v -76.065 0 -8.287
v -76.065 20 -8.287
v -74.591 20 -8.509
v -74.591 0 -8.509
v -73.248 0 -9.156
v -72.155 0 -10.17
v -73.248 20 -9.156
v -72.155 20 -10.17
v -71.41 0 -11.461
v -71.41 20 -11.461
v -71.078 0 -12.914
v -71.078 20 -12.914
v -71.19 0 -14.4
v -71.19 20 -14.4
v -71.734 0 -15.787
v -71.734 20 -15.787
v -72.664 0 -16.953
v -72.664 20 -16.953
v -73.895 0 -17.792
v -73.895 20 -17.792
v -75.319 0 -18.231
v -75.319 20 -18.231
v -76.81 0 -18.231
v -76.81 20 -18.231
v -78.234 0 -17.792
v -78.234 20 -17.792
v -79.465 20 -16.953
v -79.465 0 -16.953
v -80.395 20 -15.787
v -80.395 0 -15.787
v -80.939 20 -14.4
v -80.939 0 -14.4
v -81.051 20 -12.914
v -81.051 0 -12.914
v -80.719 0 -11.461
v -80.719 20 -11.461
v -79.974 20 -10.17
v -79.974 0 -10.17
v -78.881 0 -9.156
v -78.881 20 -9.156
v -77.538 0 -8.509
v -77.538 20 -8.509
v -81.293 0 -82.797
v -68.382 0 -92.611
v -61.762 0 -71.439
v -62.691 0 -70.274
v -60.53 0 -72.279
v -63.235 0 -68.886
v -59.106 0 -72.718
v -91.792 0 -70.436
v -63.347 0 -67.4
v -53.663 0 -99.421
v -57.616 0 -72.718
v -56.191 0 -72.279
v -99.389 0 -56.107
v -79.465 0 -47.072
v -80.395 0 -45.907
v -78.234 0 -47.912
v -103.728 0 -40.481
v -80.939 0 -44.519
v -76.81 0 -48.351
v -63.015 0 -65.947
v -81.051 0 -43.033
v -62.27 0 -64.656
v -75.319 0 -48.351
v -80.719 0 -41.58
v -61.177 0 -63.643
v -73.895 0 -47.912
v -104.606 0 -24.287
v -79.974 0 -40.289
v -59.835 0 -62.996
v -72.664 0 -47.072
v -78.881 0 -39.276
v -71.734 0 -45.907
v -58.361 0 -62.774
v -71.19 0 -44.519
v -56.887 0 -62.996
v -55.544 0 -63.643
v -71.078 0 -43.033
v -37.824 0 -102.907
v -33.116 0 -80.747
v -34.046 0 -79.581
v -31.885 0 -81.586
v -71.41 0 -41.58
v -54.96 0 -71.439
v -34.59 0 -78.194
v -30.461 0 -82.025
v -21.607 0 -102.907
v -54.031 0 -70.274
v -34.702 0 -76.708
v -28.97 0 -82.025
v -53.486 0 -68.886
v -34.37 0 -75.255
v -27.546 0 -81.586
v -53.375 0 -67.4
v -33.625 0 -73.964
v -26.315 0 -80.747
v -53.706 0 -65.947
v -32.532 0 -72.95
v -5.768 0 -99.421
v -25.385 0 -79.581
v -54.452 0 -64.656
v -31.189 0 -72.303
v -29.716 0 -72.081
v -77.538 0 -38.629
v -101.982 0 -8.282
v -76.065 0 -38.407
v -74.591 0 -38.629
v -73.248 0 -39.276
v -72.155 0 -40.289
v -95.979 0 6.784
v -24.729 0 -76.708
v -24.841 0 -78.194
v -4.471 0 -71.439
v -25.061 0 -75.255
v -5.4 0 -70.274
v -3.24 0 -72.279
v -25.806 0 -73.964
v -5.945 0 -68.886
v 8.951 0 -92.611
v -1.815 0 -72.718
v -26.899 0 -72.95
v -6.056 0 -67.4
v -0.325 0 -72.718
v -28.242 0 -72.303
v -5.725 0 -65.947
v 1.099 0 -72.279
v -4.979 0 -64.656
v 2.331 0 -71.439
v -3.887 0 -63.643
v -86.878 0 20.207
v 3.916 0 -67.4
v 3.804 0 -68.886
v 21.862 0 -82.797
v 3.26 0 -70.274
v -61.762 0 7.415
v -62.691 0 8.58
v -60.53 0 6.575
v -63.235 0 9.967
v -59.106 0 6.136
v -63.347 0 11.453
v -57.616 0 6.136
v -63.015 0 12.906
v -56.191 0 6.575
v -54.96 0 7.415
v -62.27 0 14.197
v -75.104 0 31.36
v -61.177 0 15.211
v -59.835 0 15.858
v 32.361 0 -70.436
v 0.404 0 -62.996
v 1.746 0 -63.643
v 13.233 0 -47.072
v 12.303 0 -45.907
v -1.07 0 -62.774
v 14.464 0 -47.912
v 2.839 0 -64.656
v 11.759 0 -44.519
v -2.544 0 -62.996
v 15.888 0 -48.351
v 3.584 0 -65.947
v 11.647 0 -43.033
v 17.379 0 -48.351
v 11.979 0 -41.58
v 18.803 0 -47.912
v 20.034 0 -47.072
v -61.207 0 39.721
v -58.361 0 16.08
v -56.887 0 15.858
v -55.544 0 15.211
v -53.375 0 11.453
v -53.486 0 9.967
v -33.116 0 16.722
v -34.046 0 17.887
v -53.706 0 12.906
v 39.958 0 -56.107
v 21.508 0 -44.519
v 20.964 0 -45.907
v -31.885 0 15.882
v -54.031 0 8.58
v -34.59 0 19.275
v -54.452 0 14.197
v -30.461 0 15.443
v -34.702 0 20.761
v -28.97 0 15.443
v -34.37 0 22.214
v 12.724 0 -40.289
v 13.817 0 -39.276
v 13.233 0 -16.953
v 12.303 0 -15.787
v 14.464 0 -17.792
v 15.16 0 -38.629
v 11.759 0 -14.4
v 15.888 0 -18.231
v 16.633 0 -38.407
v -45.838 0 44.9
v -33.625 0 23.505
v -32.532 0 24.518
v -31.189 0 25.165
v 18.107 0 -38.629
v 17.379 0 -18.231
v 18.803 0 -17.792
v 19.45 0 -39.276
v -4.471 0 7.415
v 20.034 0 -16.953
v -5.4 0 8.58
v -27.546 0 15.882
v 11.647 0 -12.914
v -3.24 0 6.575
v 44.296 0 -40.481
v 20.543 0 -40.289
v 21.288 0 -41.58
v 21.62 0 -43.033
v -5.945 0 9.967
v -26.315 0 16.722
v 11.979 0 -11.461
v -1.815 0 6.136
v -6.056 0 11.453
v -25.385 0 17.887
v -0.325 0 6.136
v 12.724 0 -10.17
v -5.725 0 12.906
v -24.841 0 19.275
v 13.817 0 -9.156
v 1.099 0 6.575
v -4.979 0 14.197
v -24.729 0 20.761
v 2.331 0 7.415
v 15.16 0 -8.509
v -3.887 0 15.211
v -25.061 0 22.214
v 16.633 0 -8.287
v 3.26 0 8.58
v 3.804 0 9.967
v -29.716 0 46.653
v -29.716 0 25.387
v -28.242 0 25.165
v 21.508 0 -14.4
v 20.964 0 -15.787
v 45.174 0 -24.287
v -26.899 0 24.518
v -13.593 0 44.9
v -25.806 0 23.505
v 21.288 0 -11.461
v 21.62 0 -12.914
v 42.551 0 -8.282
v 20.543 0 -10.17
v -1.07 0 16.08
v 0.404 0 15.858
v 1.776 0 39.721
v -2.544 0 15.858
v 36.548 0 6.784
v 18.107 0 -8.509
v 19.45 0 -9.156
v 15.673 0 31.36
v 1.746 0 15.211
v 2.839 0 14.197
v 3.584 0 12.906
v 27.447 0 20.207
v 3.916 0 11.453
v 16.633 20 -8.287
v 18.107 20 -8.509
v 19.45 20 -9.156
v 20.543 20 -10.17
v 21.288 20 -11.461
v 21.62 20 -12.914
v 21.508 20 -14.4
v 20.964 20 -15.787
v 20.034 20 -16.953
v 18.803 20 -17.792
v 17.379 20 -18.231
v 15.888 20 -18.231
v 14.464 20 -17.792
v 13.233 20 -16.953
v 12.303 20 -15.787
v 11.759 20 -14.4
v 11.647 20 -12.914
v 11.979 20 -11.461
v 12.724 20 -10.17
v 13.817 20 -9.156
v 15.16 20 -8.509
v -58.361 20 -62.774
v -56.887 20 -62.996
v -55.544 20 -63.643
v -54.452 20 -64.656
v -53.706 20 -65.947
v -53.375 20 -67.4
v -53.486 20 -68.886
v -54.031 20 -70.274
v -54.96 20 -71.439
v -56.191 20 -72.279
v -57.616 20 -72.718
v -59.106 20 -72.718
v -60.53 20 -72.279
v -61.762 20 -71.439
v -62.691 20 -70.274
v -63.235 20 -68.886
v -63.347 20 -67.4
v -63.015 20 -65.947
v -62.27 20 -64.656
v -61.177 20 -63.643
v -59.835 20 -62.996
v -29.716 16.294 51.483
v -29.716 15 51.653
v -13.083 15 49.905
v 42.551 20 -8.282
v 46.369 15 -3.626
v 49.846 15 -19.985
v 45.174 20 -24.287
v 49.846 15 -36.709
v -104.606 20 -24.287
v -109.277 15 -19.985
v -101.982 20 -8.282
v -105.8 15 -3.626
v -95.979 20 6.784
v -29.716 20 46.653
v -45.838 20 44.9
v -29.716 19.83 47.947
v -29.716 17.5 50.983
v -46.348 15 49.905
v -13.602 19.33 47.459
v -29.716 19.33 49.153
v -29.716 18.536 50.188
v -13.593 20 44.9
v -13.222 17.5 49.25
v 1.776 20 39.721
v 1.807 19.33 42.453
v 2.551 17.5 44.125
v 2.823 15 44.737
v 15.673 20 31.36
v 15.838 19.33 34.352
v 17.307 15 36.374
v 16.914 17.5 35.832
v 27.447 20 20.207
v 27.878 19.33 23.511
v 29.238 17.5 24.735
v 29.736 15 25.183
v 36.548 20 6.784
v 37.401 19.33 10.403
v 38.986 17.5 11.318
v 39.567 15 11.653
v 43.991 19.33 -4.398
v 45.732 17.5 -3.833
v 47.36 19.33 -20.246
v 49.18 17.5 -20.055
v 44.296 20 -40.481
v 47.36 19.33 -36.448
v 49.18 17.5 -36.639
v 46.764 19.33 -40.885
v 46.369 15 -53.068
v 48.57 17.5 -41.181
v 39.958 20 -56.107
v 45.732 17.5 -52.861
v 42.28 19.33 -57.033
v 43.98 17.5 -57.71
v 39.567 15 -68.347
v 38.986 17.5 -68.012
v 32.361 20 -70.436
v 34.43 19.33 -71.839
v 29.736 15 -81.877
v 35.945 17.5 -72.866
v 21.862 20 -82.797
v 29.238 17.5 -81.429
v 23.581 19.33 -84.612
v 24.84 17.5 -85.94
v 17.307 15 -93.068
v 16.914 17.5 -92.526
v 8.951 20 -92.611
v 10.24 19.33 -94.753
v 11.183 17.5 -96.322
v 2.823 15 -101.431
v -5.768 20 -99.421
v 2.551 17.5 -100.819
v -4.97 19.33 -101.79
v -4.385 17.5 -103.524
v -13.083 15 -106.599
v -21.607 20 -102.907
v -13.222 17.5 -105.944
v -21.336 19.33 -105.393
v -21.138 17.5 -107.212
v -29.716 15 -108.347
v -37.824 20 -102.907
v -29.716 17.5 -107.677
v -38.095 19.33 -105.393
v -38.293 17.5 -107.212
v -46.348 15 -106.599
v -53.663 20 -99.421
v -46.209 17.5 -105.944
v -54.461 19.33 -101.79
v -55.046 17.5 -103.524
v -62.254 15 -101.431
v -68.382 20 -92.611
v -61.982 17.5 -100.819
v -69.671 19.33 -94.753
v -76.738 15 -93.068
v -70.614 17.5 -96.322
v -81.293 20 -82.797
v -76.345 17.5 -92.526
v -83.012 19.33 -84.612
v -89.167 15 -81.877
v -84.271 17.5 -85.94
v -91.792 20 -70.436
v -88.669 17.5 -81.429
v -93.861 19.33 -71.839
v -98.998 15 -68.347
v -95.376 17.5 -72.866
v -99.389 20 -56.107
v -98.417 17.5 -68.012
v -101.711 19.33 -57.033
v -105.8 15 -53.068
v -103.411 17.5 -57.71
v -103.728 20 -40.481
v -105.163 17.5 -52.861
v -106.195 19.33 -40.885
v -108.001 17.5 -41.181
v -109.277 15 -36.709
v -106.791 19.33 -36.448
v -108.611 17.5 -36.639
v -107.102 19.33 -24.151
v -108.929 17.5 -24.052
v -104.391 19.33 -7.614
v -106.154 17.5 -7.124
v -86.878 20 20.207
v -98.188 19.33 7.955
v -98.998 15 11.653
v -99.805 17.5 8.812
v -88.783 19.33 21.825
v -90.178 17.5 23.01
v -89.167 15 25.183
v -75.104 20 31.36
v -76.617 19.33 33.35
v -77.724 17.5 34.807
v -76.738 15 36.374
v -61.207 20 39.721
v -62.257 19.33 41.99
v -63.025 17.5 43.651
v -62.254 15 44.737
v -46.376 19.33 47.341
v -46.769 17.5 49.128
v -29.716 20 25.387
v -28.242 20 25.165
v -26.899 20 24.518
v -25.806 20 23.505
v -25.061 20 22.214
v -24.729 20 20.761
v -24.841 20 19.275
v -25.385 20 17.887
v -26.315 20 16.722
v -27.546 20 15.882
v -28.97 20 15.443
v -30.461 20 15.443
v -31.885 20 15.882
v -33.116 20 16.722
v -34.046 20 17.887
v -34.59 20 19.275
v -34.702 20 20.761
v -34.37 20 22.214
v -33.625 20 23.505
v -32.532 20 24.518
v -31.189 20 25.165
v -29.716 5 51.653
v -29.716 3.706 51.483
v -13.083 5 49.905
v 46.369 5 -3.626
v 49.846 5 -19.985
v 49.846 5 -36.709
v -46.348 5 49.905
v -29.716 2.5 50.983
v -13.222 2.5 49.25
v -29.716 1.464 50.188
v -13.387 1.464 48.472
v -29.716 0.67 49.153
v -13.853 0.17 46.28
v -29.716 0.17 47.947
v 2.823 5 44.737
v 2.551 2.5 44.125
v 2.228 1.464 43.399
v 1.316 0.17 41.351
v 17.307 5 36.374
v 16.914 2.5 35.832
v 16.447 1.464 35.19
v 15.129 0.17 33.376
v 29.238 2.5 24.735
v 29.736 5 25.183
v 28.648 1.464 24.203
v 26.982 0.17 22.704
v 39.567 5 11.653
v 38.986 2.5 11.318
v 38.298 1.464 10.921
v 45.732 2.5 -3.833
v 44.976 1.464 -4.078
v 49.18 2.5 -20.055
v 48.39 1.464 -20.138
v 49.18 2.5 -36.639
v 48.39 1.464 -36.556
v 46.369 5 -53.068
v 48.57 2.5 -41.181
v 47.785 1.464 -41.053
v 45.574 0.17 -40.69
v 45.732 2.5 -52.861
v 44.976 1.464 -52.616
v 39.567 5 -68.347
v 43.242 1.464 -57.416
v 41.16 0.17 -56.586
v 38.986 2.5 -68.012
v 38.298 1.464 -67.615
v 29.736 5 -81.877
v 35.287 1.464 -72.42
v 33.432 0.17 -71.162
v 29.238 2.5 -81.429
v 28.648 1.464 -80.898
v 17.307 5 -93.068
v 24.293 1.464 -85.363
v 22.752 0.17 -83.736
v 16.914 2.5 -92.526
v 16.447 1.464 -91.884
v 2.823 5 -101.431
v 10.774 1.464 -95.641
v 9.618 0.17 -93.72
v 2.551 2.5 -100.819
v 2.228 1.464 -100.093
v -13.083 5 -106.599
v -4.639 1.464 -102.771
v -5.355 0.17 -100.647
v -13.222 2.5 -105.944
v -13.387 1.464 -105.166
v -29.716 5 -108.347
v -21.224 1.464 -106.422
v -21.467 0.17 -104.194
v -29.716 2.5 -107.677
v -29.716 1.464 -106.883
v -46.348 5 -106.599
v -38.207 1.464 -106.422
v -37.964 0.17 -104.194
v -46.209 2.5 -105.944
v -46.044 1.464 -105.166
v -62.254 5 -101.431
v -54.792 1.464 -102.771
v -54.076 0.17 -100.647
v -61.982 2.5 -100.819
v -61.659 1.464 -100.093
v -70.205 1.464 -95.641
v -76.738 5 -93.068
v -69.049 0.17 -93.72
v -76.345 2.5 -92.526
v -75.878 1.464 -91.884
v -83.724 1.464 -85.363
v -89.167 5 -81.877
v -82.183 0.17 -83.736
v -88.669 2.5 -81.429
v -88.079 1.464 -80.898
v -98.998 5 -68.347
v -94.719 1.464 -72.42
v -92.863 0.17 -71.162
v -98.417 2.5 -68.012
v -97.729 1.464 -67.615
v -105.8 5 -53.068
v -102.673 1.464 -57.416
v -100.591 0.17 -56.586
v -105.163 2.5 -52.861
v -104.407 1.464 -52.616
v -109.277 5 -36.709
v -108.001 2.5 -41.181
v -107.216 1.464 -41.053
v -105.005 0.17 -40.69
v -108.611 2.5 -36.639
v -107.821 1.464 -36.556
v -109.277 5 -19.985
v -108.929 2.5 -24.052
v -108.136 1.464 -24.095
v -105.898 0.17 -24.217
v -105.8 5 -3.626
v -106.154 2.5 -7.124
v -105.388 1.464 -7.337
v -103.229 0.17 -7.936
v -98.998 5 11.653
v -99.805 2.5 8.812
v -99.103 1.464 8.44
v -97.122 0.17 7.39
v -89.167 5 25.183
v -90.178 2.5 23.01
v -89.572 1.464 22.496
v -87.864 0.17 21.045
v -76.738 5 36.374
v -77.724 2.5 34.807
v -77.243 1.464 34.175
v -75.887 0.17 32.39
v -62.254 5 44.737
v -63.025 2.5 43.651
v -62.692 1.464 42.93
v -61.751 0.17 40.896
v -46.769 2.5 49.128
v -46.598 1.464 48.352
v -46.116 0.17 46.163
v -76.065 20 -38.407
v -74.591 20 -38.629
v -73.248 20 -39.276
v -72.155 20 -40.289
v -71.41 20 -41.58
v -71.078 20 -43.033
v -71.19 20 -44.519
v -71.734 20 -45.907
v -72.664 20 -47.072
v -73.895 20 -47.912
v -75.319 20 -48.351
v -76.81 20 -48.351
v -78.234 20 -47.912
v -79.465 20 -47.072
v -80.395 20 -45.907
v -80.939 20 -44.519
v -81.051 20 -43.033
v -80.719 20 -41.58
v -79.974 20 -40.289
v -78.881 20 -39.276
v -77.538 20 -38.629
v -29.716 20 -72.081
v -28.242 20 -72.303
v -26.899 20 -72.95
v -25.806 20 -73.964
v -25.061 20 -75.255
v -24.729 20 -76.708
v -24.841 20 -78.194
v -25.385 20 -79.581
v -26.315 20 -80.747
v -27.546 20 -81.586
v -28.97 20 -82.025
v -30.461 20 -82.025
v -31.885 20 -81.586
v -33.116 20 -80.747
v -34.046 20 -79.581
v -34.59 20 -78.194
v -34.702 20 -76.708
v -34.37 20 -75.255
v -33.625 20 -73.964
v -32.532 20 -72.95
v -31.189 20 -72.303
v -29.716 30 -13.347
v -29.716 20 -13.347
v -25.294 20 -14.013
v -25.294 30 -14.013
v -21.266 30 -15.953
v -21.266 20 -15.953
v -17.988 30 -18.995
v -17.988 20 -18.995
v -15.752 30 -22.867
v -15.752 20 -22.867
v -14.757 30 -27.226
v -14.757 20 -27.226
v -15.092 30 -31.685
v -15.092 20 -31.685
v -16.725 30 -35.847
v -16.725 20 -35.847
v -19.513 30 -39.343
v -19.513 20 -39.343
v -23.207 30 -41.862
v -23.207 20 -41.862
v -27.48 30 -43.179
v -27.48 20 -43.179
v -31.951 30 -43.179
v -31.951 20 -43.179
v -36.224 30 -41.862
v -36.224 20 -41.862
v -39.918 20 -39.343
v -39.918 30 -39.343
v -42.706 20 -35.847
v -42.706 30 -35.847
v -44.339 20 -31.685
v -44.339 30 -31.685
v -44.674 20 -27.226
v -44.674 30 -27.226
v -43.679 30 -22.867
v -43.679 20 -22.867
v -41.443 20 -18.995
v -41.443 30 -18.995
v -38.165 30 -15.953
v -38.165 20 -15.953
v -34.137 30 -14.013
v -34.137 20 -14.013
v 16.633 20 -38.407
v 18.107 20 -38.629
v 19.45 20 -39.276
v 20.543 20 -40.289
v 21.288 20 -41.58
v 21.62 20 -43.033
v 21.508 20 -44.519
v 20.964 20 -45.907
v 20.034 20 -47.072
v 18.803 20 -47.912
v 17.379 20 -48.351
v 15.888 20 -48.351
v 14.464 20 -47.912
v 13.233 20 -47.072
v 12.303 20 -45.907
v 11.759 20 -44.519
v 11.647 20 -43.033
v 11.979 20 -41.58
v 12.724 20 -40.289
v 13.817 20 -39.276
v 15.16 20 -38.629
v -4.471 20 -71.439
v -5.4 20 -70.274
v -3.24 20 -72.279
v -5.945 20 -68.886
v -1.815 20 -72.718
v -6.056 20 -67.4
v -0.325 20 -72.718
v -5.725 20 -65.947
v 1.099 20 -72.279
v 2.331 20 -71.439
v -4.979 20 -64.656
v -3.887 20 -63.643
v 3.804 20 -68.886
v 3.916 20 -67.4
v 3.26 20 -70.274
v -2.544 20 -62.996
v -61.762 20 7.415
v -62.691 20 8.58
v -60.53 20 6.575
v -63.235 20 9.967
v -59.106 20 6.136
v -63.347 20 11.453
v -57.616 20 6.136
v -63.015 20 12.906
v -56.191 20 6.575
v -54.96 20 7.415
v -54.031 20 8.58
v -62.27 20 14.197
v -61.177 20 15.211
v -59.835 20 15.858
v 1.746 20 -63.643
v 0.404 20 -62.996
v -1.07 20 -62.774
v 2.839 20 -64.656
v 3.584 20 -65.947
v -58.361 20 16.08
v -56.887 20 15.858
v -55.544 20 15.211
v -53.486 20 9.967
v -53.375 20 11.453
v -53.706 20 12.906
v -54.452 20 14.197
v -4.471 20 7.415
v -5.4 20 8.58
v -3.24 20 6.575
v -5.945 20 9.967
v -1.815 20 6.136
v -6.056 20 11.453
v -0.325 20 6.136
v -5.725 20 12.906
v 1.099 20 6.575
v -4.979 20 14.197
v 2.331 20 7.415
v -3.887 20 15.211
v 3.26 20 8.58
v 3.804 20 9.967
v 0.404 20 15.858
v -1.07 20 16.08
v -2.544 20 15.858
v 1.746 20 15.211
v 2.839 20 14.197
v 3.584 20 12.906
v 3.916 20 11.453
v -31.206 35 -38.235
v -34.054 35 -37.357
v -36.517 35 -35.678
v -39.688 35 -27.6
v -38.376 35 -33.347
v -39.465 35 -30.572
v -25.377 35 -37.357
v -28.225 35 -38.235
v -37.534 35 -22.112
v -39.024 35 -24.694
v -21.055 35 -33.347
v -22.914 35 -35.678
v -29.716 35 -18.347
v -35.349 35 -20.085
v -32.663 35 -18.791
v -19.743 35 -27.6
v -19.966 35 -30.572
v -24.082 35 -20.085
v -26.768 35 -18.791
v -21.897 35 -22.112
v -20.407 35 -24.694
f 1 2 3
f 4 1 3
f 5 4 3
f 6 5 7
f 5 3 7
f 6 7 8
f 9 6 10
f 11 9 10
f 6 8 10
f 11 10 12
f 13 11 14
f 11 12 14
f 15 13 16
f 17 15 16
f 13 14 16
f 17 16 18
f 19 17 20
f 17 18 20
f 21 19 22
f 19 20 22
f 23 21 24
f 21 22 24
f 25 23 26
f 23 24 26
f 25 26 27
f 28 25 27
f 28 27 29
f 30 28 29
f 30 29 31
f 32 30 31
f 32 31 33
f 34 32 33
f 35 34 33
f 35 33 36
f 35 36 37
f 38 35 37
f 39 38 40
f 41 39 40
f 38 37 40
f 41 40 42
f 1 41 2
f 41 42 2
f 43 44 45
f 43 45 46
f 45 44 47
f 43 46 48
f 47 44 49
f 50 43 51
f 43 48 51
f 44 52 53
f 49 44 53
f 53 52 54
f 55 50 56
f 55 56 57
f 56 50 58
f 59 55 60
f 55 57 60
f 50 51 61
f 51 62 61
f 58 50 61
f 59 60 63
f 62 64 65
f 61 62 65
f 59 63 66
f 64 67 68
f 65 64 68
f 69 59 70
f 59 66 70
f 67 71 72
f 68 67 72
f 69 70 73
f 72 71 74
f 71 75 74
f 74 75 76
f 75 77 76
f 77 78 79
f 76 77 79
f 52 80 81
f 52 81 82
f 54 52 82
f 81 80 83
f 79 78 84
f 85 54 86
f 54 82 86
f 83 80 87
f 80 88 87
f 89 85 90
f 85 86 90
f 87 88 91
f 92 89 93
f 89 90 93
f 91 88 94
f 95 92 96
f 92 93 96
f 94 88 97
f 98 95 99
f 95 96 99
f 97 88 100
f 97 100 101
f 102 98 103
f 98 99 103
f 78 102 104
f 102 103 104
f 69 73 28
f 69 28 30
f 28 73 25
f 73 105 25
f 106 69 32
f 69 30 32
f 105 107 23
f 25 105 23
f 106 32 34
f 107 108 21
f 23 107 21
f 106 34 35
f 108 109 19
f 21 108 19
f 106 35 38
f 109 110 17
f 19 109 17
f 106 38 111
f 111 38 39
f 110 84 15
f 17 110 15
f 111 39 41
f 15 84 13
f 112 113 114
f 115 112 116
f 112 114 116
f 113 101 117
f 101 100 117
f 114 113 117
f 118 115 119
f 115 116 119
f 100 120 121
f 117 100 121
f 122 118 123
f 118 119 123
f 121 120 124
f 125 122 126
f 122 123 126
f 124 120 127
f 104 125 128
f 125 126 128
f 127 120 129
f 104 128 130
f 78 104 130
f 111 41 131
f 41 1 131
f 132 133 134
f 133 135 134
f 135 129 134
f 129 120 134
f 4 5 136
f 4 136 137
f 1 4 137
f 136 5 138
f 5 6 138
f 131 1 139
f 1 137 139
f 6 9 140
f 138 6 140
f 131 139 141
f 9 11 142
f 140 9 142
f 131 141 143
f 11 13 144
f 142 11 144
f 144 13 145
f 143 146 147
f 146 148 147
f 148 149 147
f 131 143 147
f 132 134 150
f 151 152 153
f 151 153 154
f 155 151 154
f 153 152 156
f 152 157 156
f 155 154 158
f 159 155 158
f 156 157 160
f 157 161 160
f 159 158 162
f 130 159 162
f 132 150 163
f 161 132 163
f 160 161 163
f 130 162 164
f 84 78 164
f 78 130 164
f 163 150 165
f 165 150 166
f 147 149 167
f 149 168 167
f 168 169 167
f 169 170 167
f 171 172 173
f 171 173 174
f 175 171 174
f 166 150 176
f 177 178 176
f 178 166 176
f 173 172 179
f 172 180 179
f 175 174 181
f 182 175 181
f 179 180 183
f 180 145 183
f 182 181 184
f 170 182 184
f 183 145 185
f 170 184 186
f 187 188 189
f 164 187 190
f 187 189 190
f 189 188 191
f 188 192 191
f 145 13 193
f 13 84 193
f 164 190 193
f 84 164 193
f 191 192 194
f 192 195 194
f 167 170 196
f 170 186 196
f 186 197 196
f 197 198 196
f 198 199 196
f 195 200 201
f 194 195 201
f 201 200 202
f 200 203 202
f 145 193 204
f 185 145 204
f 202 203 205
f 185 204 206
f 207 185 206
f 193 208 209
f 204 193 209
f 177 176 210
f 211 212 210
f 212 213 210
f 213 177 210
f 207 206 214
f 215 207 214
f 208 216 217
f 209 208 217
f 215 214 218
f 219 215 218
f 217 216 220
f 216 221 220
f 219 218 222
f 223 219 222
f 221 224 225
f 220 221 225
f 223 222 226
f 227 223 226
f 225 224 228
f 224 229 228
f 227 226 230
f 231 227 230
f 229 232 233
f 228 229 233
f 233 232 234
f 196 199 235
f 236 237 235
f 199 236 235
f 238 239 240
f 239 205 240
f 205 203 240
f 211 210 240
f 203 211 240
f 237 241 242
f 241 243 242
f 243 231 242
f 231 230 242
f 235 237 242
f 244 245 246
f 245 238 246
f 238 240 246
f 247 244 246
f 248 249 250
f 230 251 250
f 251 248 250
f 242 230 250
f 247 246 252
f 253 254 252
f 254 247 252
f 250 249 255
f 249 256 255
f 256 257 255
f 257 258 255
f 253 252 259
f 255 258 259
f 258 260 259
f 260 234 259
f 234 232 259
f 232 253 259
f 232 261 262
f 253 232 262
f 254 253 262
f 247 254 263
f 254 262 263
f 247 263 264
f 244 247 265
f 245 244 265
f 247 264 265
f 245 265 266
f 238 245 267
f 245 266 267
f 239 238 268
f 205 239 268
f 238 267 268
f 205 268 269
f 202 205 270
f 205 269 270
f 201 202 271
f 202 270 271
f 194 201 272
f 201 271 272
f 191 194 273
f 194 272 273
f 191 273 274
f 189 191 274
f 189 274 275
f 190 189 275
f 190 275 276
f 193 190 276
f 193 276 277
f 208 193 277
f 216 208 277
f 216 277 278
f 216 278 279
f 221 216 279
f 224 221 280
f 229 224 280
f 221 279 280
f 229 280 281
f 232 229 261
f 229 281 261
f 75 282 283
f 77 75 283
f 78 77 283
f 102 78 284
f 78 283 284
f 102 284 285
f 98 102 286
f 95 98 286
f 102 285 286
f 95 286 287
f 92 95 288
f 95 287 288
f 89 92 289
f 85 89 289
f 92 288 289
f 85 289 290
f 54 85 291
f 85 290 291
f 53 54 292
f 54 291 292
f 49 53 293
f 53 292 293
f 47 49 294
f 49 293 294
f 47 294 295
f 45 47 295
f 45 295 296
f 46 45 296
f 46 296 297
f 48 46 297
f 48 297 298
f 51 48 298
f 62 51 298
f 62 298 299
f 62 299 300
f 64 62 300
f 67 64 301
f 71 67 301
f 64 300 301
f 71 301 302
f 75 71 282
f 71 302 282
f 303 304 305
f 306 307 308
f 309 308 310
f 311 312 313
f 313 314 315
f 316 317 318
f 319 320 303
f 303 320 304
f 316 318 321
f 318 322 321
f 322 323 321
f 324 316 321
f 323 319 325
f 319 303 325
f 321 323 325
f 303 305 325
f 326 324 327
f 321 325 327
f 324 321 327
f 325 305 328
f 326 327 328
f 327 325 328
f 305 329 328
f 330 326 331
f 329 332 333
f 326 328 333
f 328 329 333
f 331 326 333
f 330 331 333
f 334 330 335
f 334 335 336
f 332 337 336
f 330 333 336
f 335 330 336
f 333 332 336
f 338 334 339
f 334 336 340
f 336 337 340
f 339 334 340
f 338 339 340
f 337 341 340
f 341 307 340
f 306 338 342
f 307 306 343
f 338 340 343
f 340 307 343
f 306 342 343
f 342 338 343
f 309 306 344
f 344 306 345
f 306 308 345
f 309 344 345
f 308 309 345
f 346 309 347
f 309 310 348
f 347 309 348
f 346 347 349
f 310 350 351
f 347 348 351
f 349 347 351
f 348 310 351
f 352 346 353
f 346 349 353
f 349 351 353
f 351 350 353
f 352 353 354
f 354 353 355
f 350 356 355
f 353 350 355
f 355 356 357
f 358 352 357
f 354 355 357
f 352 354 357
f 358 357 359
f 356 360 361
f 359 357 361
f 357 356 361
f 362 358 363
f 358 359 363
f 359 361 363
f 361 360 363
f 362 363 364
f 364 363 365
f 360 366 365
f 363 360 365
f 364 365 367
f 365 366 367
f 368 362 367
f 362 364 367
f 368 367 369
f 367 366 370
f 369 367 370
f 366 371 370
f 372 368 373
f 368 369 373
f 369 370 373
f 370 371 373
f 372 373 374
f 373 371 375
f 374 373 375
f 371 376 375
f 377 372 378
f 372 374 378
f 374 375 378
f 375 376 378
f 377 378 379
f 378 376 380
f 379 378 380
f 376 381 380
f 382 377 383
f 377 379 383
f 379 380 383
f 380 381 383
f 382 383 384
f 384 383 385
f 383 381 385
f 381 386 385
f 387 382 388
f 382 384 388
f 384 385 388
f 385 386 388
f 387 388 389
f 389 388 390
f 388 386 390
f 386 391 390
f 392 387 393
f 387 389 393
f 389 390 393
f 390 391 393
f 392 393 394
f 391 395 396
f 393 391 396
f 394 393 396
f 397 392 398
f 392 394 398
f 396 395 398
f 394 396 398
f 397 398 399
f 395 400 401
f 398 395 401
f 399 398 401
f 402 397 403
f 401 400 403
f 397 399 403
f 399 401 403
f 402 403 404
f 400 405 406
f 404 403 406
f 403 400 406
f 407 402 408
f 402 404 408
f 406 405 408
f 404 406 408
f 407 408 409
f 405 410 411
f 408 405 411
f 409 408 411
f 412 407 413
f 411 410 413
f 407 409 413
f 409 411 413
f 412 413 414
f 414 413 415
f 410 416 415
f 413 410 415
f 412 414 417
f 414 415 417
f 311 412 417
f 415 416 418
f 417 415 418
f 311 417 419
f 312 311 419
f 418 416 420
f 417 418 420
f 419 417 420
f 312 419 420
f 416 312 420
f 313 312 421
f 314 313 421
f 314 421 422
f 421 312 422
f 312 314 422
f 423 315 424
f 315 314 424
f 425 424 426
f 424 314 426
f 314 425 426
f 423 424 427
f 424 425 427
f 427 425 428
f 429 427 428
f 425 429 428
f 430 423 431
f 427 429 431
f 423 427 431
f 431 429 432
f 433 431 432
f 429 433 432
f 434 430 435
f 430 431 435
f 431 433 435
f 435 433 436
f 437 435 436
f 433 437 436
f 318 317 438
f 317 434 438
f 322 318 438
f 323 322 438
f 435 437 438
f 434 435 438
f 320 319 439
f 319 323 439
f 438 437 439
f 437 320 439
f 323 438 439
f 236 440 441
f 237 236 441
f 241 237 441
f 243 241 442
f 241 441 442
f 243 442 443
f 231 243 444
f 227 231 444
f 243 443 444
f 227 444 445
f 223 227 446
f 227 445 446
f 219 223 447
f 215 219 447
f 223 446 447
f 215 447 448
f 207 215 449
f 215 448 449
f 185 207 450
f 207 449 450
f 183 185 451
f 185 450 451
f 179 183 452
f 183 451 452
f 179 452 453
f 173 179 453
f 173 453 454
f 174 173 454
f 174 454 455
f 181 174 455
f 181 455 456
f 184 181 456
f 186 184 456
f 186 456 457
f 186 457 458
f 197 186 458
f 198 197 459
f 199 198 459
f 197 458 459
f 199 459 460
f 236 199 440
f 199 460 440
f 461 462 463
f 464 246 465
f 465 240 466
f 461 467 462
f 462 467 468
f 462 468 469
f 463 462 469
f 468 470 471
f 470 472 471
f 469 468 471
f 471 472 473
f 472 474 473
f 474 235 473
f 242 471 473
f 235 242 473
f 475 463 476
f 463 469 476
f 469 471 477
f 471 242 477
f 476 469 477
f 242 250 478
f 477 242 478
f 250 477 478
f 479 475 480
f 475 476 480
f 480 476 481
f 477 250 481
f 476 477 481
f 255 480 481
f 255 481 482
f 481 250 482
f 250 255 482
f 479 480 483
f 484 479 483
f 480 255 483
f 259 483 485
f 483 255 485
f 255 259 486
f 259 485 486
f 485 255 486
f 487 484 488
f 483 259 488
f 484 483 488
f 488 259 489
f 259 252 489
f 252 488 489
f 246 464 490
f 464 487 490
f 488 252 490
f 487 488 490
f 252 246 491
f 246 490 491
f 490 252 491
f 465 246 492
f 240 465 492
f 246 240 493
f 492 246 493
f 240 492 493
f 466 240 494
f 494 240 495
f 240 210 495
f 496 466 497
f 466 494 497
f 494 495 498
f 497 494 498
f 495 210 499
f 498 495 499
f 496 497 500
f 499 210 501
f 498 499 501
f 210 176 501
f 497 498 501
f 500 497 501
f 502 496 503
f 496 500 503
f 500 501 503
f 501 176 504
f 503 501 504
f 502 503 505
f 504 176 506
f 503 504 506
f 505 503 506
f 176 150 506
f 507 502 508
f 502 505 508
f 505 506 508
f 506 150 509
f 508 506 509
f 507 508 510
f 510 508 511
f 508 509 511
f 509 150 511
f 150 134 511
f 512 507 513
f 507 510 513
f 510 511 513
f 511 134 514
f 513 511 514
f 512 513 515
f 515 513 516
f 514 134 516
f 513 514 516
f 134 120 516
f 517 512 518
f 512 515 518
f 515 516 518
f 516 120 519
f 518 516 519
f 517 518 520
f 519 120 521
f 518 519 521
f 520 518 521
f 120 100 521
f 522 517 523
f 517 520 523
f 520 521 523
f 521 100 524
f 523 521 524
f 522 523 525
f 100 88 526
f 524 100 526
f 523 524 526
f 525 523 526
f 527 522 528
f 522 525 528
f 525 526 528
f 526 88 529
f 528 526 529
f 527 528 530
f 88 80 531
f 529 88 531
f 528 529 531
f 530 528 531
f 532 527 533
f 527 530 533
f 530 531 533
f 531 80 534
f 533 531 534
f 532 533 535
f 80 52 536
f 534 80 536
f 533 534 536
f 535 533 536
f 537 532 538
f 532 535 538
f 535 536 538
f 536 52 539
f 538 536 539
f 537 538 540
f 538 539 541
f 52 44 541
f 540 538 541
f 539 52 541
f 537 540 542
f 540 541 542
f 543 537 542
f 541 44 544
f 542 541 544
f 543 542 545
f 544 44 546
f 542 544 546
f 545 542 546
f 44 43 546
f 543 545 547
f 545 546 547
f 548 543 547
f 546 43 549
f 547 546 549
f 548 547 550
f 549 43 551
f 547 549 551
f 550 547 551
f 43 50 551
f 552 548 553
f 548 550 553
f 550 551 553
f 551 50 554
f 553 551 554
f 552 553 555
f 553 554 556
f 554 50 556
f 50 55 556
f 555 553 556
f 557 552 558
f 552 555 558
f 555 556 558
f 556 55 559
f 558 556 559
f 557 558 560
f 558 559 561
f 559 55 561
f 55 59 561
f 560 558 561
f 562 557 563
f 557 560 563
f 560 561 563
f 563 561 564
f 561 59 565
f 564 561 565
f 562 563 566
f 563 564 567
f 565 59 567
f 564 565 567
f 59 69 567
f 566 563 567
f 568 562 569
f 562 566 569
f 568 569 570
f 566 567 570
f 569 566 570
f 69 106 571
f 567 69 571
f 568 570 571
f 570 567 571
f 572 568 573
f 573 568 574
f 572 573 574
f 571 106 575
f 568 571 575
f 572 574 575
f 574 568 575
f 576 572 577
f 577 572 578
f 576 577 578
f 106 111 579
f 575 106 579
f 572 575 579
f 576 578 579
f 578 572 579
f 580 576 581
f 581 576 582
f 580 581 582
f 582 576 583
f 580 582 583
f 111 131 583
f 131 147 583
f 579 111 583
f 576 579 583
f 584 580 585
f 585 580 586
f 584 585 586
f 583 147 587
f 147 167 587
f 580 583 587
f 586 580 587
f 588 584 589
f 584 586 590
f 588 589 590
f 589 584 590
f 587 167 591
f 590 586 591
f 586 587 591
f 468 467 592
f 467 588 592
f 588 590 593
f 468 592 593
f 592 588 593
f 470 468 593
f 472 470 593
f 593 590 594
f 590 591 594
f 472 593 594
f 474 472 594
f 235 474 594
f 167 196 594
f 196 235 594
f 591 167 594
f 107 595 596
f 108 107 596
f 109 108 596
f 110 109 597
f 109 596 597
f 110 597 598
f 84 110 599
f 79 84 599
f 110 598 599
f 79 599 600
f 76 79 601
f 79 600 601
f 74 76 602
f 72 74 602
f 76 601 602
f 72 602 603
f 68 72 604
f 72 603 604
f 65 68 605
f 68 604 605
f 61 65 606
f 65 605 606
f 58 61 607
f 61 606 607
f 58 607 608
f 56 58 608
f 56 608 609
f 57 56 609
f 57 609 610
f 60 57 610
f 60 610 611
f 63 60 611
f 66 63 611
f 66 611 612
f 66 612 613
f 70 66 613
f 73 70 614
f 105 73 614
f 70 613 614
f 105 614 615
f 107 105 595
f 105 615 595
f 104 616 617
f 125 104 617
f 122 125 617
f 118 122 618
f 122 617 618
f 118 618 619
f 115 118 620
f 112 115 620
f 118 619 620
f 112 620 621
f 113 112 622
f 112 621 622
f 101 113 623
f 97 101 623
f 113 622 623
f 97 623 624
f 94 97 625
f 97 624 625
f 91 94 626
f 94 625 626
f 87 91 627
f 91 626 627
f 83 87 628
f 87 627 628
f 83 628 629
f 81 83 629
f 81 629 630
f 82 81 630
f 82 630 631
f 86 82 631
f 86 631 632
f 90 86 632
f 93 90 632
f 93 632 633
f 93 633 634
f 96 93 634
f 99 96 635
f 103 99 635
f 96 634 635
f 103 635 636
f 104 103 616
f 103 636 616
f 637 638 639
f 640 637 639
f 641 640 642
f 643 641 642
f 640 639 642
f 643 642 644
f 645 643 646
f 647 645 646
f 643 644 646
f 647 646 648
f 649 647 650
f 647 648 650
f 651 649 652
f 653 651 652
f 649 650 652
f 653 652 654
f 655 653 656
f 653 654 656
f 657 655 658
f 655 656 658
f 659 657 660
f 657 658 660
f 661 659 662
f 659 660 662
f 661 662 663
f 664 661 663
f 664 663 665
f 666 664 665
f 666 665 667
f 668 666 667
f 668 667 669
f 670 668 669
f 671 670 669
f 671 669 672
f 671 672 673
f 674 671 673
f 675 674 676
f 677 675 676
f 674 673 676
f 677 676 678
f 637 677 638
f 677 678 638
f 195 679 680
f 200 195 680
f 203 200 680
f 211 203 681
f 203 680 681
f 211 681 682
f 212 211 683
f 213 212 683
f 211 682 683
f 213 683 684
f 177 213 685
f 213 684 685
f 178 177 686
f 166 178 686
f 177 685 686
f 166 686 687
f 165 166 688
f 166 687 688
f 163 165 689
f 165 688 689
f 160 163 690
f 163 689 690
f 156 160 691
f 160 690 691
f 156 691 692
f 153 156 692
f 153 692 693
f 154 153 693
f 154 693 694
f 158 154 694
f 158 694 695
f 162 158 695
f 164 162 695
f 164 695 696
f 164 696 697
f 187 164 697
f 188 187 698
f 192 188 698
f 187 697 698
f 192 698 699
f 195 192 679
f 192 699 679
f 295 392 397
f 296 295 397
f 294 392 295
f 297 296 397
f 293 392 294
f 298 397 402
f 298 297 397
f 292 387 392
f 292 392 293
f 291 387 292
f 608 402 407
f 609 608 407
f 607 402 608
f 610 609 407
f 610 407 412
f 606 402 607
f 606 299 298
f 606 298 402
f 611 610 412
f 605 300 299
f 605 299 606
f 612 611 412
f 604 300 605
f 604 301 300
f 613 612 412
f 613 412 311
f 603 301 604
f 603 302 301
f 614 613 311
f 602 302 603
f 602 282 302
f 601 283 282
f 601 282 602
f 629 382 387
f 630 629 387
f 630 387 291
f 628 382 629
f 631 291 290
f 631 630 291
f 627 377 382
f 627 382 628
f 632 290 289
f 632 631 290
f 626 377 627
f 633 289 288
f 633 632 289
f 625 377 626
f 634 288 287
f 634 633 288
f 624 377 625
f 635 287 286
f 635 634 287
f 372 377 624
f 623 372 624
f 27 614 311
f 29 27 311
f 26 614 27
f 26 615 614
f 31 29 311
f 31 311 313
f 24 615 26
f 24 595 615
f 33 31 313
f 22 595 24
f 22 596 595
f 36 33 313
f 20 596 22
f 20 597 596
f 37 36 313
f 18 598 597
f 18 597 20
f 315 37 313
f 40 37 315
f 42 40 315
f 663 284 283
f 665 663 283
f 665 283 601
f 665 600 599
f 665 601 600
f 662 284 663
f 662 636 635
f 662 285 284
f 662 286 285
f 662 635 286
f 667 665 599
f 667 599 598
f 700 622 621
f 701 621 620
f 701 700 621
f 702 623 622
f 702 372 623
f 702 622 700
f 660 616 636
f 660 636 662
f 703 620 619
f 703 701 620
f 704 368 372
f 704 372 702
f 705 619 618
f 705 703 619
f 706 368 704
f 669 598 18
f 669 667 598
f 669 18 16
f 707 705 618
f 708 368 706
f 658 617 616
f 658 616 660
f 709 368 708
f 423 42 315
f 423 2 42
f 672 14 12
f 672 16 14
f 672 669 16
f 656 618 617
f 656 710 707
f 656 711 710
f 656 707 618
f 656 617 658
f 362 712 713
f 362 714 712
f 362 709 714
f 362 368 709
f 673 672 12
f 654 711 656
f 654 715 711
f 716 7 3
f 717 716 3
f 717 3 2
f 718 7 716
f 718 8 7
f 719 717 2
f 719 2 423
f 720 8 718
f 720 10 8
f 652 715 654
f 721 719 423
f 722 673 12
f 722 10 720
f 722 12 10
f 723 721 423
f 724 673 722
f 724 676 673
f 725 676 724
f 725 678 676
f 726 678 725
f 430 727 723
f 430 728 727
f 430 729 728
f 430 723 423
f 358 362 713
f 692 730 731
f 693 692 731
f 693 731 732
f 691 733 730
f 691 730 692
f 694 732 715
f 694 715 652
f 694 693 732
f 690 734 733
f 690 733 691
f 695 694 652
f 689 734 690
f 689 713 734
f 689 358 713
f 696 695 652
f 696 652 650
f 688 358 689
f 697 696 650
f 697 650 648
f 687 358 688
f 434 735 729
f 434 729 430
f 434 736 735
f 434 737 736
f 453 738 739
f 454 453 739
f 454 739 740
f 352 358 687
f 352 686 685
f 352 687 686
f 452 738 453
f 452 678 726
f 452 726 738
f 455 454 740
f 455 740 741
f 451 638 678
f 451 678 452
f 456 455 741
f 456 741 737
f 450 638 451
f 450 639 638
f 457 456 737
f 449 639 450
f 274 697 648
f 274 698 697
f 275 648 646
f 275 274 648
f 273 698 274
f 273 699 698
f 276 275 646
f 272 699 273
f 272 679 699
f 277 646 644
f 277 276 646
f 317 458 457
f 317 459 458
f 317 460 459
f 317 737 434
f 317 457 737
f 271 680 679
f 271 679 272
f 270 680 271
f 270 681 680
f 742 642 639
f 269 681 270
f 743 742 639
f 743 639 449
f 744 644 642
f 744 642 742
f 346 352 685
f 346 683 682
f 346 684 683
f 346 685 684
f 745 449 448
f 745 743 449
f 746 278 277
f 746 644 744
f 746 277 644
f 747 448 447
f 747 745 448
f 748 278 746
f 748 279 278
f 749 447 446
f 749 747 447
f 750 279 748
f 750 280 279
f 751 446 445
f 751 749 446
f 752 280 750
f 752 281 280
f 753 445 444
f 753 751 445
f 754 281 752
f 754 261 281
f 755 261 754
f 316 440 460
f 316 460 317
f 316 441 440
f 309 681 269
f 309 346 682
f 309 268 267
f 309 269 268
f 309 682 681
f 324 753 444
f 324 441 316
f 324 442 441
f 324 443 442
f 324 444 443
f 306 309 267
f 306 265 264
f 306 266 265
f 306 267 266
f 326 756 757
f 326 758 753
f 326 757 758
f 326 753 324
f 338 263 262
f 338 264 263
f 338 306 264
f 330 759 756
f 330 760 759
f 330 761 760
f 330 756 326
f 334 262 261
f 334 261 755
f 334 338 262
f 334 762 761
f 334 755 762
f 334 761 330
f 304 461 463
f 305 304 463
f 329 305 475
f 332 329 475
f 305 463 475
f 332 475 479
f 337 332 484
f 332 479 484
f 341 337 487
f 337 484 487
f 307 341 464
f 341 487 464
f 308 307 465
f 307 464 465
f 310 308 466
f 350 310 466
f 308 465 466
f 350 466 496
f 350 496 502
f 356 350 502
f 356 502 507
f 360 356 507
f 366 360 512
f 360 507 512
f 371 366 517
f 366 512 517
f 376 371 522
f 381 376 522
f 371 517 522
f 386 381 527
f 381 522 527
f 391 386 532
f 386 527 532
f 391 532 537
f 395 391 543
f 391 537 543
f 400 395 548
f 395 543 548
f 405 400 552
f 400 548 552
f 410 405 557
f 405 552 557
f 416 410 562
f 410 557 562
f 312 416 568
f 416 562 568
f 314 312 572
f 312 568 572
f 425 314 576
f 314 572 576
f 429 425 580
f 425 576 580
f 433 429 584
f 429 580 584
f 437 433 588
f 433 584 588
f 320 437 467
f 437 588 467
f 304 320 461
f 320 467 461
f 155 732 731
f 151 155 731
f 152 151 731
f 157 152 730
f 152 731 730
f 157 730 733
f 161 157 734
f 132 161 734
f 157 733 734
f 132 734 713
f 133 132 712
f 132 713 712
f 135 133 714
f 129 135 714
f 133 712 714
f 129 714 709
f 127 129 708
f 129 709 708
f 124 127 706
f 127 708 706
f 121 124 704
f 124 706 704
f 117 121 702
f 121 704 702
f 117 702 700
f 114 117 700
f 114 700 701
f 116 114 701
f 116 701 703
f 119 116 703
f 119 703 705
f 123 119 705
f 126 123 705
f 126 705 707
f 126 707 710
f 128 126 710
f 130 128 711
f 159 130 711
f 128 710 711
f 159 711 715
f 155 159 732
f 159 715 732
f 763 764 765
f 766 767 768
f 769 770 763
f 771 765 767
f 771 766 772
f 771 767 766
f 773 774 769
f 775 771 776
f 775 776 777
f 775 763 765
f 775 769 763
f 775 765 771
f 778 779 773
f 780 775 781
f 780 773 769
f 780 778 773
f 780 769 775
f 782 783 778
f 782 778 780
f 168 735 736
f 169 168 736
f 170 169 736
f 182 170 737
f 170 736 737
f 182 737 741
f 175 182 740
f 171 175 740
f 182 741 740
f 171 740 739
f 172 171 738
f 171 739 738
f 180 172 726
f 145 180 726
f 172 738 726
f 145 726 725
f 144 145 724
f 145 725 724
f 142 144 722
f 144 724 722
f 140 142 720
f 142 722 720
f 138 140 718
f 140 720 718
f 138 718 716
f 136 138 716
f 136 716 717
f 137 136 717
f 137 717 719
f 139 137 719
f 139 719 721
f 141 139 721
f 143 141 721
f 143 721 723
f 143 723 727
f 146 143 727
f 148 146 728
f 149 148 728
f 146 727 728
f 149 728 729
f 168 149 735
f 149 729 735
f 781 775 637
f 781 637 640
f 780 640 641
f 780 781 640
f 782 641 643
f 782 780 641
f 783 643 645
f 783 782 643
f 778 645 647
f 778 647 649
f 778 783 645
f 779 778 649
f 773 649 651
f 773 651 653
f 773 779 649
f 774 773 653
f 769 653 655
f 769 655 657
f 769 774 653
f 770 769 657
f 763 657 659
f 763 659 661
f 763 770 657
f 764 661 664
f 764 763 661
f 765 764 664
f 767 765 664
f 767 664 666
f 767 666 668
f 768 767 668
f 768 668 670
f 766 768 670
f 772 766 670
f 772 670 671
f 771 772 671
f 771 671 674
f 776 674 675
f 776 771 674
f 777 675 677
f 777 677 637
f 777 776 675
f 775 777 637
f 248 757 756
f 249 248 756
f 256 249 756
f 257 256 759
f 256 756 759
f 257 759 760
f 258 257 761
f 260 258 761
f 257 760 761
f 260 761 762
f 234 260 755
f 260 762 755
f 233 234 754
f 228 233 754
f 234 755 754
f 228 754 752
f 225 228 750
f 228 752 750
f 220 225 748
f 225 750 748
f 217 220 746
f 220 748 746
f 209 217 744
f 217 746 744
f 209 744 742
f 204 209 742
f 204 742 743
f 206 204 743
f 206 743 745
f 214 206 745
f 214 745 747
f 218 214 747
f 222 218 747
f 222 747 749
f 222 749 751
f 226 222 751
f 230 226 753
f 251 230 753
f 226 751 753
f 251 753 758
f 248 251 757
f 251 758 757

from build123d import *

# Parameters (mm, degrees)
SKETCH1_R           = 80
BOSS_EXTRUDE1_DEPTH = 20
SKETCH3_R           = 15
BOSS_EXTRUDE2_DEPTH = 15
CHAMFER1_SIZE       = 5
FILLET2_R           = 5
FILLET3_R           = 5
SKETCH4_R           = 5
CUT_EXTRUDE2_DEPTH  = 20


with BuildPart() as part:
    # Sketch1 → Boss-Extrude1 (new body)
    with BuildSketch(Plane(origin=(0, 0, 0), x_dir=(1, 0, 0), z_dir=(0, 1, 0))):
        with Locations(Location((-29.715512057, 28.347034528, 0), (0, 0, 270))):
            Circle(SKETCH1_R)
    extrude(amount=BOSS_EXTRUDE1_DEPTH)

    # Sketch3 → Boss-Extrude2 (add)
    with BuildSketch(Plane(origin=(0, 20, 0), x_dir=(1, 0, 0), z_dir=(0, 1, 0))):
        with Locations(Location((-29.715512057, 28.347034528, 0), (0, 0, 270))):
            Circle(SKETCH3_R)
    extrude(amount=BOSS_EXTRUDE2_DEPTH)

    # Chamfer1
    chamfer1_edges = [part.edges().sort_by_distance(p)[0] for p in [
        (-29.715512057, 35, -43.347034528),
    ]]
    chamfer(chamfer1_edges, length=CHAMFER1_SIZE)

    # Fillet2
    fillet2_edges = [part.edges().sort_by_distance(p)[0] for p in [
        (-29.715512057, 20, -108.347034528),
    ]]
    fillet(fillet2_edges, radius=FILLET2_R)

    # Fillet3
    fillet3_edges = [part.edges().sort_by_distance(p)[0] for p in [
        (-29.715512057, 0, -108.347034528),
    ]]
    fillet(fillet3_edges, radius=FILLET3_R)

    # Sketch4 → Cut-Extrude2 (cut)
    with BuildSketch(Plane(origin=(0, 20, 0), x_dir=(1, 0, 0), z_dir=(0, 1, 0))):
        with Locations(Location((-29.715512057, 77.081261822, 0), (0, 0, 270))):
            Circle(SKETCH4_R)
        with Locations(Location((-1.070251971, 67.773852617, 0), (0, 0, 270))):
            Circle(SKETCH4_R)
        with Locations(Location((16.633492378, 43.406738969, 0), (0, 0, 270))):
            Circle(SKETCH4_R)
        with Locations(Location((16.633492378, 13.287330086, 0), (0, 0, 270))):
            Circle(SKETCH4_R)
        with Locations(Location((-1.070251971, -11.079783561, 0), (0, 0, 270))):
            Circle(SKETCH4_R)
        with Locations(Location((-29.715512057, -20.387192767, 0), (0, 0, 270))):
            Circle(SKETCH4_R)
        with Locations(Location((-58.360772142, -11.079783561, 0), (0, 0, 270))):
            Circle(SKETCH4_R)
        with Locations(Location((-76.064516492, 13.287330086, 0), (0, 0, 270))):
            Circle(SKETCH4_R)
        with Locations(Location((-76.064516492, 43.406738969, 0), (0, 0, 270))):
            Circle(SKETCH4_R)
        with Locations(Location((-58.360772142, 67.773852617, 0), (0, 0, 270))):
            Circle(SKETCH4_R)
    extrude(amount=-CUT_EXTRUDE2_DEPTH, mode=Mode.SUBTRACT)


solid = part.part
